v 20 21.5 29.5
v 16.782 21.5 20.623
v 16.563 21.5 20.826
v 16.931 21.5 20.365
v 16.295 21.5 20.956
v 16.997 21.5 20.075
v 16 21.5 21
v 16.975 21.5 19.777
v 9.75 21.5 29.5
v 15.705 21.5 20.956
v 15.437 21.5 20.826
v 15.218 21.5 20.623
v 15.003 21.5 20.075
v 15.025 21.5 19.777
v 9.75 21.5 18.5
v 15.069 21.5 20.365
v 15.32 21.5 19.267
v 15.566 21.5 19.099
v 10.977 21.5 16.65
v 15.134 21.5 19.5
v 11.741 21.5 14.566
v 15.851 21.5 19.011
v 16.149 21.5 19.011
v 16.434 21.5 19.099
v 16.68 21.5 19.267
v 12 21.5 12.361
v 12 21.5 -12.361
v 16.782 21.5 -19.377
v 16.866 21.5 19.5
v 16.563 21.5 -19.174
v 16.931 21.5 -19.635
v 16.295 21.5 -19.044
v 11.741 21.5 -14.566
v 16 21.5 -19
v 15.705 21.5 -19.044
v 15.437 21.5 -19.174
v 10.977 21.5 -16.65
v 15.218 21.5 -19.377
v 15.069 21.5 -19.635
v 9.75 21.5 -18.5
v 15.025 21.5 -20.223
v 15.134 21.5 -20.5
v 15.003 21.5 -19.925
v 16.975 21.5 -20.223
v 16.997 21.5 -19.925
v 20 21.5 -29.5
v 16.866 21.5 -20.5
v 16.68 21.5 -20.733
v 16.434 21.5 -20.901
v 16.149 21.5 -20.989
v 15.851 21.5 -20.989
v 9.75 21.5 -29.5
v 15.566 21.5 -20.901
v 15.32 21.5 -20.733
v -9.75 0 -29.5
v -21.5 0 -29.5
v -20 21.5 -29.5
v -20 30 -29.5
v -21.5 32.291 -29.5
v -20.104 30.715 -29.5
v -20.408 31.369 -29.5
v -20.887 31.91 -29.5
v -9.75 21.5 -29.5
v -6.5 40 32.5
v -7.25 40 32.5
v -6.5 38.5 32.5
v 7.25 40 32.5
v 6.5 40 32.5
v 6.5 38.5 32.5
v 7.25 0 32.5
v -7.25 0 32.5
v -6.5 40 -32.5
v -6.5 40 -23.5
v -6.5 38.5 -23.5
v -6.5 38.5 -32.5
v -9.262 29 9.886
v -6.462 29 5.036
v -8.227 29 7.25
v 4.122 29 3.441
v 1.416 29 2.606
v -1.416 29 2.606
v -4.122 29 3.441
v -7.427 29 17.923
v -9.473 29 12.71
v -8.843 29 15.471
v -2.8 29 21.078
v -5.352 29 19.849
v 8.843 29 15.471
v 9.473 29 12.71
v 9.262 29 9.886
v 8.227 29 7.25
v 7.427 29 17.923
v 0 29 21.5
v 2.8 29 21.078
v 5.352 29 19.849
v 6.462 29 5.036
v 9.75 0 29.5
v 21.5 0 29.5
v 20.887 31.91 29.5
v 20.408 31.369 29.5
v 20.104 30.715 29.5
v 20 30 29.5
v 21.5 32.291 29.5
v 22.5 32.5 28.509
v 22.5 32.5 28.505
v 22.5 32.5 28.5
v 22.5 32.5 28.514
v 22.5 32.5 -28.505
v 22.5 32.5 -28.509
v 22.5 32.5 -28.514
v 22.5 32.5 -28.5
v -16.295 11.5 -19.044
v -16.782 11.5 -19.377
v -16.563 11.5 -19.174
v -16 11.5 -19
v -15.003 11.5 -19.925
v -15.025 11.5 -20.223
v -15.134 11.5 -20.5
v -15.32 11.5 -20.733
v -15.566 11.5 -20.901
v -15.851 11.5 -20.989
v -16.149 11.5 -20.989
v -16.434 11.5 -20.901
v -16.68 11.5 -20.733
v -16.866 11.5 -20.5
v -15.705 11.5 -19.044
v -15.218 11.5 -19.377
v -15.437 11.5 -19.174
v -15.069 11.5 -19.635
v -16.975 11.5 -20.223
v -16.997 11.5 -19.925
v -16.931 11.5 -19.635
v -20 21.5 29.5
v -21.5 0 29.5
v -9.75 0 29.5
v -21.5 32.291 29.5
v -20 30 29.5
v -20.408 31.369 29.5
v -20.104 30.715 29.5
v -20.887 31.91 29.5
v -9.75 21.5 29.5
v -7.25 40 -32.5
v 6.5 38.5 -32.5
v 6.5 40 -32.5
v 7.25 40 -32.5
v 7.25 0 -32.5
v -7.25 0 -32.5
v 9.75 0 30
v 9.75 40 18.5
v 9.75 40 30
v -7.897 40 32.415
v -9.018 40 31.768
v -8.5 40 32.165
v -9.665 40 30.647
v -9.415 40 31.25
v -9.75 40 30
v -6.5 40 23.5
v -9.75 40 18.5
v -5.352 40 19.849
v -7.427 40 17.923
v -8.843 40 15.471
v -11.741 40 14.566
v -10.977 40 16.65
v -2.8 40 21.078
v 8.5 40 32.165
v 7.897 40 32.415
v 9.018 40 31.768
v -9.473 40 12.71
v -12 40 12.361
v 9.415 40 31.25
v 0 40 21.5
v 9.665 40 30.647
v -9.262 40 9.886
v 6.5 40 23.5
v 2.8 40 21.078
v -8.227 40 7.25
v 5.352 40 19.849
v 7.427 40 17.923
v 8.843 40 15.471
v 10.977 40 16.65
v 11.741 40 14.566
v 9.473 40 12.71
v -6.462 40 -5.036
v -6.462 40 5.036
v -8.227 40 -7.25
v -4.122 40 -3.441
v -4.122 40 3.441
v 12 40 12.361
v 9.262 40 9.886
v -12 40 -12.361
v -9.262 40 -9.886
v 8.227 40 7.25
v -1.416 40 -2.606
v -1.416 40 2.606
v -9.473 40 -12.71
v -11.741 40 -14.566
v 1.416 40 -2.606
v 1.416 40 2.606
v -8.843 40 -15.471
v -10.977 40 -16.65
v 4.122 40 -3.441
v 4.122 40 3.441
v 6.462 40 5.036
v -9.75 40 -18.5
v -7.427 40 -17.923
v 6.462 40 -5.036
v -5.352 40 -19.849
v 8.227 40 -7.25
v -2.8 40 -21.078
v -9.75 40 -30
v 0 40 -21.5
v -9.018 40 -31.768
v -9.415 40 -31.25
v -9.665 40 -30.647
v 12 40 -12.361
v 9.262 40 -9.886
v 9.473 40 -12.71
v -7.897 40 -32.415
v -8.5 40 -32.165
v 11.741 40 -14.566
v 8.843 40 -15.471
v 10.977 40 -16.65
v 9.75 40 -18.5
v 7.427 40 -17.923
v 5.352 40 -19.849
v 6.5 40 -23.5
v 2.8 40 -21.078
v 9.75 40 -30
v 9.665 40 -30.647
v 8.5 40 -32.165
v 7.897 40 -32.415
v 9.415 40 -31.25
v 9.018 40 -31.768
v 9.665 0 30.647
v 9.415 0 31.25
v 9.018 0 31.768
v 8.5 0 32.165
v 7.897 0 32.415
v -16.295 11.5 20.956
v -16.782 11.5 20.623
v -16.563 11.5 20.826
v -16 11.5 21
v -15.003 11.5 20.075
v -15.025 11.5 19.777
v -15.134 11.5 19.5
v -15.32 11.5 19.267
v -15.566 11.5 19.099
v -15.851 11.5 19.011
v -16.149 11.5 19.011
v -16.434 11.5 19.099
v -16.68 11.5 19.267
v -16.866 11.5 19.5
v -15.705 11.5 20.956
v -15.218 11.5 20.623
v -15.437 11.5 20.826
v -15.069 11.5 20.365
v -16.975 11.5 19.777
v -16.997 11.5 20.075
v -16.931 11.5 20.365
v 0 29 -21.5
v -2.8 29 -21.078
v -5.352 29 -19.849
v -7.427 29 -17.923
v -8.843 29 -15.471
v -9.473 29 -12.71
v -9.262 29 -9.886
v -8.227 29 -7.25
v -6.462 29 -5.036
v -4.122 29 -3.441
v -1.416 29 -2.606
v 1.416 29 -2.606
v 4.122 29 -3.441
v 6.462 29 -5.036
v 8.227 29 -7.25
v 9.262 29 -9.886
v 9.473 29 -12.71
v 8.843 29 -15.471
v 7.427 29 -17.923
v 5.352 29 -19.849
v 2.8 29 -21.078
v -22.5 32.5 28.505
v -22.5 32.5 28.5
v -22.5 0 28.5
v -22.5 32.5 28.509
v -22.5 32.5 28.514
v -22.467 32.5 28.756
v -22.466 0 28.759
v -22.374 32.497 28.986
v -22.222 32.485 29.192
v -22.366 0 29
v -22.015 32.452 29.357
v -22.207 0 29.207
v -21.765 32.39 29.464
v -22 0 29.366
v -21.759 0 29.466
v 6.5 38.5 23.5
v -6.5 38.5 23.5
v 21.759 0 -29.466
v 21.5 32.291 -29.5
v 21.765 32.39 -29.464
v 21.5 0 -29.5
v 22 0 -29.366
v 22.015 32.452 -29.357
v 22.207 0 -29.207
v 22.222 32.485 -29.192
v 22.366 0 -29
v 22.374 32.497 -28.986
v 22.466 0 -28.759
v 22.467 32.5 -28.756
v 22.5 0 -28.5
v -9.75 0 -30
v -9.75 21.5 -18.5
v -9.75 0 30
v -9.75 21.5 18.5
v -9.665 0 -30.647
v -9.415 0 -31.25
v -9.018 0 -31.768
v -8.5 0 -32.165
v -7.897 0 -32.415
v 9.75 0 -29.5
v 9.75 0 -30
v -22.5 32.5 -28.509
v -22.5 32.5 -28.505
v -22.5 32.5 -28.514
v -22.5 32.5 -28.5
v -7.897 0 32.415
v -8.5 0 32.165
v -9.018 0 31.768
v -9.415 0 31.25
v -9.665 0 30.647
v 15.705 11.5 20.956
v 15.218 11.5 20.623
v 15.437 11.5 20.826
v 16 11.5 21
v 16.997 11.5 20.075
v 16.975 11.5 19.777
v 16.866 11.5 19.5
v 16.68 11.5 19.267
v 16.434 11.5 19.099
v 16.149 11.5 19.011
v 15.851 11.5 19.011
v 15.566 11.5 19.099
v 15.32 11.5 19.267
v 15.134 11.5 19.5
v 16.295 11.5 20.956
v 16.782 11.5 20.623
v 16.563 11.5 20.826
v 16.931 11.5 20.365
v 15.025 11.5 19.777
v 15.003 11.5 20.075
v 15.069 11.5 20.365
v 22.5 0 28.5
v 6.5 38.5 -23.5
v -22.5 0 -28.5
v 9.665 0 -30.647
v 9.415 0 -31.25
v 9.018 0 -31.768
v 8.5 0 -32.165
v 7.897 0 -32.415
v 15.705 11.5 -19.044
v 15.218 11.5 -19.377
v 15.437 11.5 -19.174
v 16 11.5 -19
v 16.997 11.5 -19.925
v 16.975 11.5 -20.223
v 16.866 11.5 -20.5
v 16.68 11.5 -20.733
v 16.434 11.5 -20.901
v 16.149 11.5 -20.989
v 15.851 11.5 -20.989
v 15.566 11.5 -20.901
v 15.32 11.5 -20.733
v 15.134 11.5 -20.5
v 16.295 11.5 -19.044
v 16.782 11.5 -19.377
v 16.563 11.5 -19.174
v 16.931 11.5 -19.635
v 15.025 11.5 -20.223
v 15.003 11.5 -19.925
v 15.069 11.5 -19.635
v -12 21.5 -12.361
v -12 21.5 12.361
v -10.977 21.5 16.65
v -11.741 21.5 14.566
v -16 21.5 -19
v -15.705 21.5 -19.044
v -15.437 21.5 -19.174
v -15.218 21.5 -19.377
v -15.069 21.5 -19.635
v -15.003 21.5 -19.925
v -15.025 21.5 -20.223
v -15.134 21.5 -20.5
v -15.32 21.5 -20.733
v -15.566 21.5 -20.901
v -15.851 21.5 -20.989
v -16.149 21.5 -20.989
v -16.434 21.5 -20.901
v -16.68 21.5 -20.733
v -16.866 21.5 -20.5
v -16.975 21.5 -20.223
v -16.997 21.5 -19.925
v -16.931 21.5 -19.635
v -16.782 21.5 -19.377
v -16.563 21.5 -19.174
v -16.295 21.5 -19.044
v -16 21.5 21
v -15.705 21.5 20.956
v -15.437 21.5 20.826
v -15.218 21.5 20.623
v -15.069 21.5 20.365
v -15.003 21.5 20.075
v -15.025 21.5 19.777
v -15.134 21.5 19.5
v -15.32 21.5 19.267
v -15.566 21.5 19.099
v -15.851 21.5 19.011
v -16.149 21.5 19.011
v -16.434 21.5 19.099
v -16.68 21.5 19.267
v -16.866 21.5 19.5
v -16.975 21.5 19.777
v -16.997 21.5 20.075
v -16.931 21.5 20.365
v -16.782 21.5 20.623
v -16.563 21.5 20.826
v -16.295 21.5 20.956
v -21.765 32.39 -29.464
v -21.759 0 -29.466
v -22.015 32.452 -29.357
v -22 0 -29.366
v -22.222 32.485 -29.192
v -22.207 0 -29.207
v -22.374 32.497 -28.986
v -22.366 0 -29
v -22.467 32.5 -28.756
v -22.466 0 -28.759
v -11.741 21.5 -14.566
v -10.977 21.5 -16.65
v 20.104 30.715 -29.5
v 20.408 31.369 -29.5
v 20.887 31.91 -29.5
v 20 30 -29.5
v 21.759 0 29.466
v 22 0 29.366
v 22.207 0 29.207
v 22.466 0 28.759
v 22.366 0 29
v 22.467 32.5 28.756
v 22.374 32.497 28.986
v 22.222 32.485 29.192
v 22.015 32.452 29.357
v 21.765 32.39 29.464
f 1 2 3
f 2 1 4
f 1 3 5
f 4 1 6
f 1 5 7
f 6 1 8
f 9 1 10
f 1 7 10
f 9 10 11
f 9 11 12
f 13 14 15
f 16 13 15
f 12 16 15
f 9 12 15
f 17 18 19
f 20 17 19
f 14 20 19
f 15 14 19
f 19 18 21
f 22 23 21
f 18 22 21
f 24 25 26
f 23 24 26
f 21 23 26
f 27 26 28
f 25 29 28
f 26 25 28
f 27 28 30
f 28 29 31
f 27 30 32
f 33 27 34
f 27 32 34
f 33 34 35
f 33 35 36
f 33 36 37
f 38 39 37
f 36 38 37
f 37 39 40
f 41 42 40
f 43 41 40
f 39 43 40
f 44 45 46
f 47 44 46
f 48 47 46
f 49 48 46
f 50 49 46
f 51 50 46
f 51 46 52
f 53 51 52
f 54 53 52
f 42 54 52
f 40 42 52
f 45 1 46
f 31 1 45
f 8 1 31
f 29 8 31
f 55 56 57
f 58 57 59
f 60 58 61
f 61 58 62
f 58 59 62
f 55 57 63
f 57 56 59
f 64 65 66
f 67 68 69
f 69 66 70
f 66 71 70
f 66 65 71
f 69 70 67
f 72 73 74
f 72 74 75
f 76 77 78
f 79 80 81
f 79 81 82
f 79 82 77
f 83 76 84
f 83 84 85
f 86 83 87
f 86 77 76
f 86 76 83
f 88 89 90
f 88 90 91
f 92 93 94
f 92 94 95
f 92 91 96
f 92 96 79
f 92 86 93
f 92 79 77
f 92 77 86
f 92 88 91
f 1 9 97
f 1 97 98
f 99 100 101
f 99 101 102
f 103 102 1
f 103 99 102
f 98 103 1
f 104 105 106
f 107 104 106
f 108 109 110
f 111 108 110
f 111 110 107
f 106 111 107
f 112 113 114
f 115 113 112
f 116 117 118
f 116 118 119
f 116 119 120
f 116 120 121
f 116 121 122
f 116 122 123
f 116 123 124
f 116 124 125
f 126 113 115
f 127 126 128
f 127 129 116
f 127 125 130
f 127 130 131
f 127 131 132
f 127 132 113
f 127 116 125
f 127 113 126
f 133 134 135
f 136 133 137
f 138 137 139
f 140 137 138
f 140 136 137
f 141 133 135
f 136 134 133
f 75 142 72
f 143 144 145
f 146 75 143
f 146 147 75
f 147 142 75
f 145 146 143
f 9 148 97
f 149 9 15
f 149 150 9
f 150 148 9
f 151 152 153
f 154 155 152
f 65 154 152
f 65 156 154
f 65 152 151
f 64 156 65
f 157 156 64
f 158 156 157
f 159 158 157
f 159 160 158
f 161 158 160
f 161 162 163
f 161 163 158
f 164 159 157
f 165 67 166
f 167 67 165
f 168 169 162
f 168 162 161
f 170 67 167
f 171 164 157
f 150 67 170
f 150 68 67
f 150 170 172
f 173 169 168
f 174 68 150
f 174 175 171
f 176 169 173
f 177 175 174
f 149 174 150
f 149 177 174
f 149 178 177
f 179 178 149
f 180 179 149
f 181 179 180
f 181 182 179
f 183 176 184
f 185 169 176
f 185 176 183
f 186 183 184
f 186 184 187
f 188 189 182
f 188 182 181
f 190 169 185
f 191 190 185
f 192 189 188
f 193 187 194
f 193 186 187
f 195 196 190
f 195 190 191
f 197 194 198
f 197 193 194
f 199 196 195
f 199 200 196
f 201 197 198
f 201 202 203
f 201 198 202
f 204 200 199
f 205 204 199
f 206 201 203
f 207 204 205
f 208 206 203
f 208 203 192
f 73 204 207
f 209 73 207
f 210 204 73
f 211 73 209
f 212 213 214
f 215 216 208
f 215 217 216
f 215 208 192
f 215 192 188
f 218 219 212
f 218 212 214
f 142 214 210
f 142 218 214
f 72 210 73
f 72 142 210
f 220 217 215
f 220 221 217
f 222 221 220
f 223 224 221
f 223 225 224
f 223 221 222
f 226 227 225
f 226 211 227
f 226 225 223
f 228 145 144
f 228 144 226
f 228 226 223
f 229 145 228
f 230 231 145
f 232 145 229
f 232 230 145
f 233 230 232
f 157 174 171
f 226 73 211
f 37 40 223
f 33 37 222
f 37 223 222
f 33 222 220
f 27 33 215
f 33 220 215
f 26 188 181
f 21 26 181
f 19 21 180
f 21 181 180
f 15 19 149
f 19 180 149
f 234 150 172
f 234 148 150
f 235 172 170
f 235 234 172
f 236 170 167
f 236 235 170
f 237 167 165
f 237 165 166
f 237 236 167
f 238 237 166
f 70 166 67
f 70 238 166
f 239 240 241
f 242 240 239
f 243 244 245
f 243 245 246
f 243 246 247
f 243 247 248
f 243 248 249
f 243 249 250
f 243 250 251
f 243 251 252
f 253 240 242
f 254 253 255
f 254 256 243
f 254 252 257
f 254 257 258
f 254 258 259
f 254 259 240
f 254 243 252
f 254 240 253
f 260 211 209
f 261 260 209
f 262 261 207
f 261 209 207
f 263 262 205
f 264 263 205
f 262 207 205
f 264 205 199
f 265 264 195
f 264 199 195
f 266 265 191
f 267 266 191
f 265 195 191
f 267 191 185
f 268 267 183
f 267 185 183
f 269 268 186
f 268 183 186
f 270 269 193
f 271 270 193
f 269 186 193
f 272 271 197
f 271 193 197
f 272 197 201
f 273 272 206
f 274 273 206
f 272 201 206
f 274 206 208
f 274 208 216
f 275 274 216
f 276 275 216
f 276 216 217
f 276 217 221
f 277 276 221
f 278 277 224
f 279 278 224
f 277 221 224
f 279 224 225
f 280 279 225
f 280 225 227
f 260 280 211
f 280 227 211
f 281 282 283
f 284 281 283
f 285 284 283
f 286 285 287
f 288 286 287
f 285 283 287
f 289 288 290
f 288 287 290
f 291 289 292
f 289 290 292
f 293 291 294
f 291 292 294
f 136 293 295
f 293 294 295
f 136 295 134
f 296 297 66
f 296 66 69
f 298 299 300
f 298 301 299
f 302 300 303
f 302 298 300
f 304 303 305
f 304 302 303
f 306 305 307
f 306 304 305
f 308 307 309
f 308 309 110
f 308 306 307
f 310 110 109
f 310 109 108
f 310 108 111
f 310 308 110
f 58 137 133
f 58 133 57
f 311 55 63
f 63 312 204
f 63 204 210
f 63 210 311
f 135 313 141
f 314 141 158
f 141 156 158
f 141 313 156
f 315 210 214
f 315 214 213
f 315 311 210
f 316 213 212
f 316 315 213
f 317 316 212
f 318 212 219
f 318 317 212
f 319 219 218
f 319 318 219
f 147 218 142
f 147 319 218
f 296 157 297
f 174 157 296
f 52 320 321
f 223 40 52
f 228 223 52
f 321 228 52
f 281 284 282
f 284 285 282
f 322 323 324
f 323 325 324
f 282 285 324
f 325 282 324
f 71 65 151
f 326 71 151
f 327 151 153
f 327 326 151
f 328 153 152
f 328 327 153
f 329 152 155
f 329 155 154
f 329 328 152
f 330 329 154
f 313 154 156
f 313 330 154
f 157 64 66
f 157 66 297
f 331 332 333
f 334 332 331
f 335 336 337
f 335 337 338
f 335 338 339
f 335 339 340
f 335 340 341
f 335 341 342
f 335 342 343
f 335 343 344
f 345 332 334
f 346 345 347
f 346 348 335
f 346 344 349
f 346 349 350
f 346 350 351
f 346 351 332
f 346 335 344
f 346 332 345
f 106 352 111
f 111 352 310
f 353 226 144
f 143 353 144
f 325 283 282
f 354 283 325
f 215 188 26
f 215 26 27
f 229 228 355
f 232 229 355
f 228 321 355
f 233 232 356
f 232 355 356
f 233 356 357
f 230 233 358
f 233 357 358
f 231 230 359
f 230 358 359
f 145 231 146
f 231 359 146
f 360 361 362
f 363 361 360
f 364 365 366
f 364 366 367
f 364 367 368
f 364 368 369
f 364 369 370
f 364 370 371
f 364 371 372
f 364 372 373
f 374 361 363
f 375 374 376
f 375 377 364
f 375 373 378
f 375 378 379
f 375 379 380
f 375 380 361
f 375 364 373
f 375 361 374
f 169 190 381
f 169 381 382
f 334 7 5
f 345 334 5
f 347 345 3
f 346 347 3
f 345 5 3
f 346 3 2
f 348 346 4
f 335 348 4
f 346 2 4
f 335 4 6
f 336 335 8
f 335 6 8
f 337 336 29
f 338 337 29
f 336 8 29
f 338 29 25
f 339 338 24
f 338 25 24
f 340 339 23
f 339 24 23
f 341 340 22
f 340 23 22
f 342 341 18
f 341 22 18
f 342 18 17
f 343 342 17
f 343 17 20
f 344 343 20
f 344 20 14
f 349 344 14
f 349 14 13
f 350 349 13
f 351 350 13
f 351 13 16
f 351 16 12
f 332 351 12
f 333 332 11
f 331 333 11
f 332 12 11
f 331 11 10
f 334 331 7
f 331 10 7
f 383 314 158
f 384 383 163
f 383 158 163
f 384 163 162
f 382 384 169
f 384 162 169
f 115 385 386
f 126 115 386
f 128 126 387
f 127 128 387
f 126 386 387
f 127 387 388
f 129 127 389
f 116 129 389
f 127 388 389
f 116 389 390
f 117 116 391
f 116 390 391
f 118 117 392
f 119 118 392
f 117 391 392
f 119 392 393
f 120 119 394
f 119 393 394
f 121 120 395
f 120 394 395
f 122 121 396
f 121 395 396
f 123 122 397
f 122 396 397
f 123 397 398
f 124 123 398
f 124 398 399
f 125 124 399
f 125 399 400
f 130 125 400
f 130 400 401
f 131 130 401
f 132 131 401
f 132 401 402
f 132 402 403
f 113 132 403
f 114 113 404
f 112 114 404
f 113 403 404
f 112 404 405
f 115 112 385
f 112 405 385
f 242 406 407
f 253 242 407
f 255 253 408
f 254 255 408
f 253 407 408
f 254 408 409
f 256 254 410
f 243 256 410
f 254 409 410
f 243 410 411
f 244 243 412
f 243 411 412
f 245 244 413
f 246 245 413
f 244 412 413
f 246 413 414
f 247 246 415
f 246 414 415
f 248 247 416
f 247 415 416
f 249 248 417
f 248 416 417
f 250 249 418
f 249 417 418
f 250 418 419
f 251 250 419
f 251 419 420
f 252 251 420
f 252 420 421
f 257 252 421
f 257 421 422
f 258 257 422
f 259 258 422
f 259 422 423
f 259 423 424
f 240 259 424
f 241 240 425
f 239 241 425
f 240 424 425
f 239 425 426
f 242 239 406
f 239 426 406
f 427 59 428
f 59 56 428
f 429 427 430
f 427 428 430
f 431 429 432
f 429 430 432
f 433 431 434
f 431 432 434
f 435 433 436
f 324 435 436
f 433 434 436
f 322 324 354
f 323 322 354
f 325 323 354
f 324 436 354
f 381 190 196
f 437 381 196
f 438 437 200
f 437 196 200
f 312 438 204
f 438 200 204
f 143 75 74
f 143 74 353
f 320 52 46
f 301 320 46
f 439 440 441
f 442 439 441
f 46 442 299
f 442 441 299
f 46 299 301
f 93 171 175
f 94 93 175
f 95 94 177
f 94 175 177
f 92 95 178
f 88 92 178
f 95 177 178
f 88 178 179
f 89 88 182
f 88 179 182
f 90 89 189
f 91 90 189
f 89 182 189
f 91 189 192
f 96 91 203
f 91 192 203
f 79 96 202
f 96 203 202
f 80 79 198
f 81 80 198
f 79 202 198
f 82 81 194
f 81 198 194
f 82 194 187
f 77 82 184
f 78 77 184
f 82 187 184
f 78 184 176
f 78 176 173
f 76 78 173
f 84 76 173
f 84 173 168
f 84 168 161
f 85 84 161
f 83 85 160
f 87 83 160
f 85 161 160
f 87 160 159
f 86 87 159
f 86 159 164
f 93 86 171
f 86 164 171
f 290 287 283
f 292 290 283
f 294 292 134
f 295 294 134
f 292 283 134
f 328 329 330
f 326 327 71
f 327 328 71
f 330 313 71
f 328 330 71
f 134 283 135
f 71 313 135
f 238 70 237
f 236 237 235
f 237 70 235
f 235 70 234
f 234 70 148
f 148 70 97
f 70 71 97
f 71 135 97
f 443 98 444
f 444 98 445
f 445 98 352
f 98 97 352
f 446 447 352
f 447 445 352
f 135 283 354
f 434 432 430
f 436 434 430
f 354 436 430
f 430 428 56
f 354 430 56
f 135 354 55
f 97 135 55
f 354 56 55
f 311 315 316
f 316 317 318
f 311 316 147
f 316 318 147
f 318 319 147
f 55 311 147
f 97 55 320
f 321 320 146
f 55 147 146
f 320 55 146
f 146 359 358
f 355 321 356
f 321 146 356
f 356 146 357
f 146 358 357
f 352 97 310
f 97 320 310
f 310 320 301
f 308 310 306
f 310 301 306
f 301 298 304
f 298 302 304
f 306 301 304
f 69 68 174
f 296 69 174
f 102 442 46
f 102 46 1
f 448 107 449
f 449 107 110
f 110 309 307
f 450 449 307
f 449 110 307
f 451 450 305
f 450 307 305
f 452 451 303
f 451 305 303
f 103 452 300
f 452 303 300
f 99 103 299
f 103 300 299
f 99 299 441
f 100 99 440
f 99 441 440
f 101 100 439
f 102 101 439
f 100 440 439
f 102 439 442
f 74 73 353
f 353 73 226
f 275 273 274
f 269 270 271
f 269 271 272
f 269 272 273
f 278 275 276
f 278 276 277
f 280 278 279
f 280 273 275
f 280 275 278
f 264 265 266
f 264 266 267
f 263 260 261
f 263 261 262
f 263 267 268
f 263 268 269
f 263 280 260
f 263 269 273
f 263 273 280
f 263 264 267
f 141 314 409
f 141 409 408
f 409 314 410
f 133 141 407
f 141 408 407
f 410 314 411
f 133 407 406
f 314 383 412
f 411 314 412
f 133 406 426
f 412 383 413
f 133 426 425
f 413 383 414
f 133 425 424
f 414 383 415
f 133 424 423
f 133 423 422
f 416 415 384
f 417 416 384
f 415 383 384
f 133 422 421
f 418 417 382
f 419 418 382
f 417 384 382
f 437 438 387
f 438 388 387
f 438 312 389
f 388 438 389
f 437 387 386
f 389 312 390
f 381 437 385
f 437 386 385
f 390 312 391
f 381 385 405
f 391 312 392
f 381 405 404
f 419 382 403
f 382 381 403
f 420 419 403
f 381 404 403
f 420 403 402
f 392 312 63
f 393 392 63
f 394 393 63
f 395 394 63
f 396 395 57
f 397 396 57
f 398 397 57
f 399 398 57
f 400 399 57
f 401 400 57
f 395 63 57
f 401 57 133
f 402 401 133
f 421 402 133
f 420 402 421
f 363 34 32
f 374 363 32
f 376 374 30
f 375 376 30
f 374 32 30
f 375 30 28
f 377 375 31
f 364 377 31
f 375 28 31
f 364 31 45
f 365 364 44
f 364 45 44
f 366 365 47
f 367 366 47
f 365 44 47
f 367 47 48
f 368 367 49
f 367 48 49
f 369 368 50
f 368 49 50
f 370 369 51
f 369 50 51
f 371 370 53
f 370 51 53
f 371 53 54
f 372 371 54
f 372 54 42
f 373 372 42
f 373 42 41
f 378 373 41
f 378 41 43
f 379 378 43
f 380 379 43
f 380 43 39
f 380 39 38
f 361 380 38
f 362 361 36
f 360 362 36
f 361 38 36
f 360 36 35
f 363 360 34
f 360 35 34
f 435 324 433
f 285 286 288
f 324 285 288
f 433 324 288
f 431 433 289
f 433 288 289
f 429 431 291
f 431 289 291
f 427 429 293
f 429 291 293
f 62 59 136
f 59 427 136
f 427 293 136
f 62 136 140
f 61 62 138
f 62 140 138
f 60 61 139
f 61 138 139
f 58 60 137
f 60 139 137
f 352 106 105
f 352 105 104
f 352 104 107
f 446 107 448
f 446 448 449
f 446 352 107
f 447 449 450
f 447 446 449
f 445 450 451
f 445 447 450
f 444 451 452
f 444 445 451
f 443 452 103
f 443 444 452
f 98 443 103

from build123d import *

# Parameters (mm, degrees)
SKETCH1_W           = 45
SKETCH1_H           = 65
BOSS_EXTRUDE1_DEPTH = 40
SKETCH2_W           = 12.75
SKETCH2_H           = 3
CUT_EXTRUDE1_DEPTH  = 40
CUT_EXTRUDE2_DEPTH  = 7.5
CUT_EXTRUDE3_DEPTH  = 18.5
SKETCH6_W           = 13
SKETCH6_H           = 23
CUT_EXTRUDE4_DEPTH  = 1.5
SKETCH7_R           = 9.5
CUT_EXTRUDE5_DEPTH  = 11
SKETCH8_R           = 1
CUT_EXTRUDE6_DEPTH  = 10
FILLET1_R           = 2.5
FILLET2_R           = 2.5
FILLET3_R           = 2.5
FILLET4_R           = 1
FILLET5_R           = 9.5


# Some blends are built 0.0001 mm under size
with BuildPart() as part:
    # Sketch1 → Boss-Extrude1 (new body)
    with BuildSketch(Plane(origin=(0, 0, 0), x_dir=(1, 0, 0), z_dir=(0, 1, 0))):
        Rectangle(SKETCH1_W, SKETCH1_H)
    extrude(amount=BOSS_EXTRUDE1_DEPTH)

    # Sketch2 → Cut-Extrude1 (cut)
    with BuildSketch(Plane(origin=(0, 40, 0), x_dir=(1, 0, 0), z_dir=(0, 1, 0))):
        with Locations((-16.125, 31)):
            Rectangle(SKETCH2_W, SKETCH2_H)
        with Locations((16.125, 31)):
            Rectangle(SKETCH2_W, SKETCH2_H)
        with Locations((-16.125, -31)):
            Rectangle(SKETCH2_W, SKETCH2_H)
        with Locations((16.125, -31)):
            Rectangle(SKETCH2_W, SKETCH2_H)
    extrude(amount=-CUT_EXTRUDE1_DEPTH, mode=Mode.SUBTRACT)

    # Sketch3 → Cut-Extrude2 (cut)
    with BuildSketch(Plane(origin=(0, 40, 0), x_dir=(1, 0, 0), z_dir=(0, 1, 0))):
        Polygon((-22.5, 29.5), (-9.75, 29.5), (-9.75, 18.5), (-12, 18.5), (-12, -18.5), (-9.75, -18.5), (-9.75, -29.5), (-22.5, -29.5), (-22.5, -18.5), (-22.5, 18.5), align=None)
        Polygon((22.5, -29.5), (9.75, -29.5), (9.75, -18.5), (12, -18.5), (12, 18.5), (9.75, 18.5), (9.75, 29.5), (22.5, 29.5), (22.5, 18.5), (22.5, -18.5), align=None)
    extrude(amount=-CUT_EXTRUDE2_DEPTH, mode=Mode.SUBTRACT)

    # Sketch5 → Cut-Extrude3 (cut)
    with BuildSketch(Plane(origin=(0, 40, 0), x_dir=(1, 0, 0), z_dir=(0, 1, 0))):
        Polygon((-20, 29.5), (-12, 29.5), (-9.75, 29.5), (-9.75, 18.5), (-12, 18.5), (-12, -18.5), (-9.75, -18.5), (-9.75, -29.5), (-12, -29.5), (-20, -29.5), align=None)
        Polygon((12, -29.5), (9.75, -29.5), (9.75, -18.5), (12, -18.5), (12, 18.5), (9.75, 18.5), (9.75, 29.5), (12, 29.5), (20, 29.5), (20, -29.5), align=None)
    extrude(amount=-CUT_EXTRUDE3_DEPTH, mode=Mode.SUBTRACT)

    # Sketch6 → Cut-Extrude4 (cut)
    with BuildSketch(Plane(origin=(0, 40, 0), x_dir=(1, 0, 0), z_dir=(0, 1, 0))):
        with Locations((0, 35)):
            Rectangle(SKETCH6_W, SKETCH6_H)
        with Locations((0, -35)):
            Rectangle(SKETCH6_W, SKETCH6_H)
    extrude(amount=-CUT_EXTRUDE4_DEPTH, mode=Mode.SUBTRACT)

    # Sketch7 → Cut-Extrude5 (cut)
    with BuildSketch(Plane(origin=(0, 40, 0), x_dir=(1, 0, 0), z_dir=(0, 1, 0))):
        with Locations(Location((0, -12, 0), (0, 0, 270))):
            Circle(SKETCH7_R)
        with Locations(Location((0, 12, 0), (0, 0, 90))):
            Circle(SKETCH7_R)
    extrude(amount=-CUT_EXTRUDE5_DEPTH, mode=Mode.SUBTRACT)

    # Sketch8 → Cut-Extrude6 (cut)
    with BuildSketch(Plane(origin=(0, 21.5, 0), x_dir=(1, 0, 0), z_dir=(0, 1, 0))):
        with Locations(Location((-16, 20, 0), (0, 0, 270))):
            Circle(SKETCH8_R)
        with Locations(Location((16, 20, 0), (0, 0, 270))):
            Circle(SKETCH8_R)
        with Locations(Location((16, -20, 0), (0, 0, 270))):
            Circle(SKETCH8_R)
        with Locations(Location((-16, -20, 0), (0, 0, 270))):
            Circle(SKETCH8_R)
    extrude(amount=-CUT_EXTRUDE6_DEPTH, mode=Mode.SUBTRACT)

    # Fillet1
    fillet1_edges = [part.edges().sort_by_distance(p)[0] for p in [
        (-20, 32.5, 0),
    ]]
    fillet(fillet1_edges, radius=FILLET1_R - 0.0001)  # a hair under: the kernel refuses the full size

    # Fillet2
    fillet2_edges = [part.edges().sort_by_distance(p)[0] for p in [
        (20, 32.5, 0),
    ]]
    fillet(fillet2_edges, radius=FILLET2_R - 0.0001)  # a hair under: the kernel refuses the full size

    # Fillet3
    fillet3_edges = [part.edges().sort_by_distance(p)[0] for p in [
        (9.75, 20, -32.5),
        (-9.75, 20, 32.5),
        (-9.75, 20, -32.5),
        (9.75, 20, 32.5),
    ]]
    fillet(fillet3_edges, radius=FILLET3_R)

    # Fillet4
    fillet4_edges = [part.edges().sort_by_distance(p)[0] for p in [
        (22.5, 16.25, -29.5),
        (-22.5, 16.25, 29.5),
        (-22.5, 16.25, -29.5),
        (22.5, 16.25, 29.5),
    ]]
    fillet(fillet4_edges, radius=FILLET4_R)

    # Fillet5
    # the kernel refuses this fillet: 9.5 mm, written as the material it takes off along each edge
    with BuildSketch(Plane(origin=(12, 55.347536447, 18.5), x_dir=(-1, 0, 0), z_dir=(0, -1, 0)), Plane(origin=(-12, 55.347536447, -18.5), x_dir=(1, 0, 0), z_dir=(0, -1, 0))) as fillet5_piece_1:
        with BuildLine():
            CenterArc((9.5, 6.139014579), FILLET5_R, 180, 40.256612576)
            Line((0, 6.139014579), (-0.19, 6.139014579))
            Line((-0.19, 6.139014579), (-0.19, 0))
            Line((-0.19, 0), (0, -0.19))
            ThreePointArc((0, -0.19), (1.125, -0.19), (2.105, -0.122780292))
            Line((2.105, -0.122780292), (2.25, 0))
        make_face()
    extrude(amount=33.847536447, mode=Mode.SUBTRACT)
    with BuildSketch(Plane(origin=(-12, 55.347536447, 18.5), x_dir=(1, 0, 0), z_dir=(0, -1, 0)), Plane(origin=(12, 55.347536447, -18.5), x_dir=(-1, 0, 0), z_dir=(0, -1, 0))) as fillet5_piece_2:
        with BuildLine():
            CenterArc((9.5, -6.139014579), FILLET5_R, 139.743387424, 40.256612576)
            Line((0, -6.139014579), (-0.19, -6.139014579))
            Line((-0.19, -6.139014579), (-0.19, 0))
            Line((-0.19, 0), (0, 0.19))
            ThreePointArc((0, 0.19), (1.125, 0.19), (2.105, 0.122780292))
            Line((2.105, 0.122780292), (2.25, 0))
        make_face()
    extrude(amount=33.847536447, mode=Mode.SUBTRACT)


solid = part.part
